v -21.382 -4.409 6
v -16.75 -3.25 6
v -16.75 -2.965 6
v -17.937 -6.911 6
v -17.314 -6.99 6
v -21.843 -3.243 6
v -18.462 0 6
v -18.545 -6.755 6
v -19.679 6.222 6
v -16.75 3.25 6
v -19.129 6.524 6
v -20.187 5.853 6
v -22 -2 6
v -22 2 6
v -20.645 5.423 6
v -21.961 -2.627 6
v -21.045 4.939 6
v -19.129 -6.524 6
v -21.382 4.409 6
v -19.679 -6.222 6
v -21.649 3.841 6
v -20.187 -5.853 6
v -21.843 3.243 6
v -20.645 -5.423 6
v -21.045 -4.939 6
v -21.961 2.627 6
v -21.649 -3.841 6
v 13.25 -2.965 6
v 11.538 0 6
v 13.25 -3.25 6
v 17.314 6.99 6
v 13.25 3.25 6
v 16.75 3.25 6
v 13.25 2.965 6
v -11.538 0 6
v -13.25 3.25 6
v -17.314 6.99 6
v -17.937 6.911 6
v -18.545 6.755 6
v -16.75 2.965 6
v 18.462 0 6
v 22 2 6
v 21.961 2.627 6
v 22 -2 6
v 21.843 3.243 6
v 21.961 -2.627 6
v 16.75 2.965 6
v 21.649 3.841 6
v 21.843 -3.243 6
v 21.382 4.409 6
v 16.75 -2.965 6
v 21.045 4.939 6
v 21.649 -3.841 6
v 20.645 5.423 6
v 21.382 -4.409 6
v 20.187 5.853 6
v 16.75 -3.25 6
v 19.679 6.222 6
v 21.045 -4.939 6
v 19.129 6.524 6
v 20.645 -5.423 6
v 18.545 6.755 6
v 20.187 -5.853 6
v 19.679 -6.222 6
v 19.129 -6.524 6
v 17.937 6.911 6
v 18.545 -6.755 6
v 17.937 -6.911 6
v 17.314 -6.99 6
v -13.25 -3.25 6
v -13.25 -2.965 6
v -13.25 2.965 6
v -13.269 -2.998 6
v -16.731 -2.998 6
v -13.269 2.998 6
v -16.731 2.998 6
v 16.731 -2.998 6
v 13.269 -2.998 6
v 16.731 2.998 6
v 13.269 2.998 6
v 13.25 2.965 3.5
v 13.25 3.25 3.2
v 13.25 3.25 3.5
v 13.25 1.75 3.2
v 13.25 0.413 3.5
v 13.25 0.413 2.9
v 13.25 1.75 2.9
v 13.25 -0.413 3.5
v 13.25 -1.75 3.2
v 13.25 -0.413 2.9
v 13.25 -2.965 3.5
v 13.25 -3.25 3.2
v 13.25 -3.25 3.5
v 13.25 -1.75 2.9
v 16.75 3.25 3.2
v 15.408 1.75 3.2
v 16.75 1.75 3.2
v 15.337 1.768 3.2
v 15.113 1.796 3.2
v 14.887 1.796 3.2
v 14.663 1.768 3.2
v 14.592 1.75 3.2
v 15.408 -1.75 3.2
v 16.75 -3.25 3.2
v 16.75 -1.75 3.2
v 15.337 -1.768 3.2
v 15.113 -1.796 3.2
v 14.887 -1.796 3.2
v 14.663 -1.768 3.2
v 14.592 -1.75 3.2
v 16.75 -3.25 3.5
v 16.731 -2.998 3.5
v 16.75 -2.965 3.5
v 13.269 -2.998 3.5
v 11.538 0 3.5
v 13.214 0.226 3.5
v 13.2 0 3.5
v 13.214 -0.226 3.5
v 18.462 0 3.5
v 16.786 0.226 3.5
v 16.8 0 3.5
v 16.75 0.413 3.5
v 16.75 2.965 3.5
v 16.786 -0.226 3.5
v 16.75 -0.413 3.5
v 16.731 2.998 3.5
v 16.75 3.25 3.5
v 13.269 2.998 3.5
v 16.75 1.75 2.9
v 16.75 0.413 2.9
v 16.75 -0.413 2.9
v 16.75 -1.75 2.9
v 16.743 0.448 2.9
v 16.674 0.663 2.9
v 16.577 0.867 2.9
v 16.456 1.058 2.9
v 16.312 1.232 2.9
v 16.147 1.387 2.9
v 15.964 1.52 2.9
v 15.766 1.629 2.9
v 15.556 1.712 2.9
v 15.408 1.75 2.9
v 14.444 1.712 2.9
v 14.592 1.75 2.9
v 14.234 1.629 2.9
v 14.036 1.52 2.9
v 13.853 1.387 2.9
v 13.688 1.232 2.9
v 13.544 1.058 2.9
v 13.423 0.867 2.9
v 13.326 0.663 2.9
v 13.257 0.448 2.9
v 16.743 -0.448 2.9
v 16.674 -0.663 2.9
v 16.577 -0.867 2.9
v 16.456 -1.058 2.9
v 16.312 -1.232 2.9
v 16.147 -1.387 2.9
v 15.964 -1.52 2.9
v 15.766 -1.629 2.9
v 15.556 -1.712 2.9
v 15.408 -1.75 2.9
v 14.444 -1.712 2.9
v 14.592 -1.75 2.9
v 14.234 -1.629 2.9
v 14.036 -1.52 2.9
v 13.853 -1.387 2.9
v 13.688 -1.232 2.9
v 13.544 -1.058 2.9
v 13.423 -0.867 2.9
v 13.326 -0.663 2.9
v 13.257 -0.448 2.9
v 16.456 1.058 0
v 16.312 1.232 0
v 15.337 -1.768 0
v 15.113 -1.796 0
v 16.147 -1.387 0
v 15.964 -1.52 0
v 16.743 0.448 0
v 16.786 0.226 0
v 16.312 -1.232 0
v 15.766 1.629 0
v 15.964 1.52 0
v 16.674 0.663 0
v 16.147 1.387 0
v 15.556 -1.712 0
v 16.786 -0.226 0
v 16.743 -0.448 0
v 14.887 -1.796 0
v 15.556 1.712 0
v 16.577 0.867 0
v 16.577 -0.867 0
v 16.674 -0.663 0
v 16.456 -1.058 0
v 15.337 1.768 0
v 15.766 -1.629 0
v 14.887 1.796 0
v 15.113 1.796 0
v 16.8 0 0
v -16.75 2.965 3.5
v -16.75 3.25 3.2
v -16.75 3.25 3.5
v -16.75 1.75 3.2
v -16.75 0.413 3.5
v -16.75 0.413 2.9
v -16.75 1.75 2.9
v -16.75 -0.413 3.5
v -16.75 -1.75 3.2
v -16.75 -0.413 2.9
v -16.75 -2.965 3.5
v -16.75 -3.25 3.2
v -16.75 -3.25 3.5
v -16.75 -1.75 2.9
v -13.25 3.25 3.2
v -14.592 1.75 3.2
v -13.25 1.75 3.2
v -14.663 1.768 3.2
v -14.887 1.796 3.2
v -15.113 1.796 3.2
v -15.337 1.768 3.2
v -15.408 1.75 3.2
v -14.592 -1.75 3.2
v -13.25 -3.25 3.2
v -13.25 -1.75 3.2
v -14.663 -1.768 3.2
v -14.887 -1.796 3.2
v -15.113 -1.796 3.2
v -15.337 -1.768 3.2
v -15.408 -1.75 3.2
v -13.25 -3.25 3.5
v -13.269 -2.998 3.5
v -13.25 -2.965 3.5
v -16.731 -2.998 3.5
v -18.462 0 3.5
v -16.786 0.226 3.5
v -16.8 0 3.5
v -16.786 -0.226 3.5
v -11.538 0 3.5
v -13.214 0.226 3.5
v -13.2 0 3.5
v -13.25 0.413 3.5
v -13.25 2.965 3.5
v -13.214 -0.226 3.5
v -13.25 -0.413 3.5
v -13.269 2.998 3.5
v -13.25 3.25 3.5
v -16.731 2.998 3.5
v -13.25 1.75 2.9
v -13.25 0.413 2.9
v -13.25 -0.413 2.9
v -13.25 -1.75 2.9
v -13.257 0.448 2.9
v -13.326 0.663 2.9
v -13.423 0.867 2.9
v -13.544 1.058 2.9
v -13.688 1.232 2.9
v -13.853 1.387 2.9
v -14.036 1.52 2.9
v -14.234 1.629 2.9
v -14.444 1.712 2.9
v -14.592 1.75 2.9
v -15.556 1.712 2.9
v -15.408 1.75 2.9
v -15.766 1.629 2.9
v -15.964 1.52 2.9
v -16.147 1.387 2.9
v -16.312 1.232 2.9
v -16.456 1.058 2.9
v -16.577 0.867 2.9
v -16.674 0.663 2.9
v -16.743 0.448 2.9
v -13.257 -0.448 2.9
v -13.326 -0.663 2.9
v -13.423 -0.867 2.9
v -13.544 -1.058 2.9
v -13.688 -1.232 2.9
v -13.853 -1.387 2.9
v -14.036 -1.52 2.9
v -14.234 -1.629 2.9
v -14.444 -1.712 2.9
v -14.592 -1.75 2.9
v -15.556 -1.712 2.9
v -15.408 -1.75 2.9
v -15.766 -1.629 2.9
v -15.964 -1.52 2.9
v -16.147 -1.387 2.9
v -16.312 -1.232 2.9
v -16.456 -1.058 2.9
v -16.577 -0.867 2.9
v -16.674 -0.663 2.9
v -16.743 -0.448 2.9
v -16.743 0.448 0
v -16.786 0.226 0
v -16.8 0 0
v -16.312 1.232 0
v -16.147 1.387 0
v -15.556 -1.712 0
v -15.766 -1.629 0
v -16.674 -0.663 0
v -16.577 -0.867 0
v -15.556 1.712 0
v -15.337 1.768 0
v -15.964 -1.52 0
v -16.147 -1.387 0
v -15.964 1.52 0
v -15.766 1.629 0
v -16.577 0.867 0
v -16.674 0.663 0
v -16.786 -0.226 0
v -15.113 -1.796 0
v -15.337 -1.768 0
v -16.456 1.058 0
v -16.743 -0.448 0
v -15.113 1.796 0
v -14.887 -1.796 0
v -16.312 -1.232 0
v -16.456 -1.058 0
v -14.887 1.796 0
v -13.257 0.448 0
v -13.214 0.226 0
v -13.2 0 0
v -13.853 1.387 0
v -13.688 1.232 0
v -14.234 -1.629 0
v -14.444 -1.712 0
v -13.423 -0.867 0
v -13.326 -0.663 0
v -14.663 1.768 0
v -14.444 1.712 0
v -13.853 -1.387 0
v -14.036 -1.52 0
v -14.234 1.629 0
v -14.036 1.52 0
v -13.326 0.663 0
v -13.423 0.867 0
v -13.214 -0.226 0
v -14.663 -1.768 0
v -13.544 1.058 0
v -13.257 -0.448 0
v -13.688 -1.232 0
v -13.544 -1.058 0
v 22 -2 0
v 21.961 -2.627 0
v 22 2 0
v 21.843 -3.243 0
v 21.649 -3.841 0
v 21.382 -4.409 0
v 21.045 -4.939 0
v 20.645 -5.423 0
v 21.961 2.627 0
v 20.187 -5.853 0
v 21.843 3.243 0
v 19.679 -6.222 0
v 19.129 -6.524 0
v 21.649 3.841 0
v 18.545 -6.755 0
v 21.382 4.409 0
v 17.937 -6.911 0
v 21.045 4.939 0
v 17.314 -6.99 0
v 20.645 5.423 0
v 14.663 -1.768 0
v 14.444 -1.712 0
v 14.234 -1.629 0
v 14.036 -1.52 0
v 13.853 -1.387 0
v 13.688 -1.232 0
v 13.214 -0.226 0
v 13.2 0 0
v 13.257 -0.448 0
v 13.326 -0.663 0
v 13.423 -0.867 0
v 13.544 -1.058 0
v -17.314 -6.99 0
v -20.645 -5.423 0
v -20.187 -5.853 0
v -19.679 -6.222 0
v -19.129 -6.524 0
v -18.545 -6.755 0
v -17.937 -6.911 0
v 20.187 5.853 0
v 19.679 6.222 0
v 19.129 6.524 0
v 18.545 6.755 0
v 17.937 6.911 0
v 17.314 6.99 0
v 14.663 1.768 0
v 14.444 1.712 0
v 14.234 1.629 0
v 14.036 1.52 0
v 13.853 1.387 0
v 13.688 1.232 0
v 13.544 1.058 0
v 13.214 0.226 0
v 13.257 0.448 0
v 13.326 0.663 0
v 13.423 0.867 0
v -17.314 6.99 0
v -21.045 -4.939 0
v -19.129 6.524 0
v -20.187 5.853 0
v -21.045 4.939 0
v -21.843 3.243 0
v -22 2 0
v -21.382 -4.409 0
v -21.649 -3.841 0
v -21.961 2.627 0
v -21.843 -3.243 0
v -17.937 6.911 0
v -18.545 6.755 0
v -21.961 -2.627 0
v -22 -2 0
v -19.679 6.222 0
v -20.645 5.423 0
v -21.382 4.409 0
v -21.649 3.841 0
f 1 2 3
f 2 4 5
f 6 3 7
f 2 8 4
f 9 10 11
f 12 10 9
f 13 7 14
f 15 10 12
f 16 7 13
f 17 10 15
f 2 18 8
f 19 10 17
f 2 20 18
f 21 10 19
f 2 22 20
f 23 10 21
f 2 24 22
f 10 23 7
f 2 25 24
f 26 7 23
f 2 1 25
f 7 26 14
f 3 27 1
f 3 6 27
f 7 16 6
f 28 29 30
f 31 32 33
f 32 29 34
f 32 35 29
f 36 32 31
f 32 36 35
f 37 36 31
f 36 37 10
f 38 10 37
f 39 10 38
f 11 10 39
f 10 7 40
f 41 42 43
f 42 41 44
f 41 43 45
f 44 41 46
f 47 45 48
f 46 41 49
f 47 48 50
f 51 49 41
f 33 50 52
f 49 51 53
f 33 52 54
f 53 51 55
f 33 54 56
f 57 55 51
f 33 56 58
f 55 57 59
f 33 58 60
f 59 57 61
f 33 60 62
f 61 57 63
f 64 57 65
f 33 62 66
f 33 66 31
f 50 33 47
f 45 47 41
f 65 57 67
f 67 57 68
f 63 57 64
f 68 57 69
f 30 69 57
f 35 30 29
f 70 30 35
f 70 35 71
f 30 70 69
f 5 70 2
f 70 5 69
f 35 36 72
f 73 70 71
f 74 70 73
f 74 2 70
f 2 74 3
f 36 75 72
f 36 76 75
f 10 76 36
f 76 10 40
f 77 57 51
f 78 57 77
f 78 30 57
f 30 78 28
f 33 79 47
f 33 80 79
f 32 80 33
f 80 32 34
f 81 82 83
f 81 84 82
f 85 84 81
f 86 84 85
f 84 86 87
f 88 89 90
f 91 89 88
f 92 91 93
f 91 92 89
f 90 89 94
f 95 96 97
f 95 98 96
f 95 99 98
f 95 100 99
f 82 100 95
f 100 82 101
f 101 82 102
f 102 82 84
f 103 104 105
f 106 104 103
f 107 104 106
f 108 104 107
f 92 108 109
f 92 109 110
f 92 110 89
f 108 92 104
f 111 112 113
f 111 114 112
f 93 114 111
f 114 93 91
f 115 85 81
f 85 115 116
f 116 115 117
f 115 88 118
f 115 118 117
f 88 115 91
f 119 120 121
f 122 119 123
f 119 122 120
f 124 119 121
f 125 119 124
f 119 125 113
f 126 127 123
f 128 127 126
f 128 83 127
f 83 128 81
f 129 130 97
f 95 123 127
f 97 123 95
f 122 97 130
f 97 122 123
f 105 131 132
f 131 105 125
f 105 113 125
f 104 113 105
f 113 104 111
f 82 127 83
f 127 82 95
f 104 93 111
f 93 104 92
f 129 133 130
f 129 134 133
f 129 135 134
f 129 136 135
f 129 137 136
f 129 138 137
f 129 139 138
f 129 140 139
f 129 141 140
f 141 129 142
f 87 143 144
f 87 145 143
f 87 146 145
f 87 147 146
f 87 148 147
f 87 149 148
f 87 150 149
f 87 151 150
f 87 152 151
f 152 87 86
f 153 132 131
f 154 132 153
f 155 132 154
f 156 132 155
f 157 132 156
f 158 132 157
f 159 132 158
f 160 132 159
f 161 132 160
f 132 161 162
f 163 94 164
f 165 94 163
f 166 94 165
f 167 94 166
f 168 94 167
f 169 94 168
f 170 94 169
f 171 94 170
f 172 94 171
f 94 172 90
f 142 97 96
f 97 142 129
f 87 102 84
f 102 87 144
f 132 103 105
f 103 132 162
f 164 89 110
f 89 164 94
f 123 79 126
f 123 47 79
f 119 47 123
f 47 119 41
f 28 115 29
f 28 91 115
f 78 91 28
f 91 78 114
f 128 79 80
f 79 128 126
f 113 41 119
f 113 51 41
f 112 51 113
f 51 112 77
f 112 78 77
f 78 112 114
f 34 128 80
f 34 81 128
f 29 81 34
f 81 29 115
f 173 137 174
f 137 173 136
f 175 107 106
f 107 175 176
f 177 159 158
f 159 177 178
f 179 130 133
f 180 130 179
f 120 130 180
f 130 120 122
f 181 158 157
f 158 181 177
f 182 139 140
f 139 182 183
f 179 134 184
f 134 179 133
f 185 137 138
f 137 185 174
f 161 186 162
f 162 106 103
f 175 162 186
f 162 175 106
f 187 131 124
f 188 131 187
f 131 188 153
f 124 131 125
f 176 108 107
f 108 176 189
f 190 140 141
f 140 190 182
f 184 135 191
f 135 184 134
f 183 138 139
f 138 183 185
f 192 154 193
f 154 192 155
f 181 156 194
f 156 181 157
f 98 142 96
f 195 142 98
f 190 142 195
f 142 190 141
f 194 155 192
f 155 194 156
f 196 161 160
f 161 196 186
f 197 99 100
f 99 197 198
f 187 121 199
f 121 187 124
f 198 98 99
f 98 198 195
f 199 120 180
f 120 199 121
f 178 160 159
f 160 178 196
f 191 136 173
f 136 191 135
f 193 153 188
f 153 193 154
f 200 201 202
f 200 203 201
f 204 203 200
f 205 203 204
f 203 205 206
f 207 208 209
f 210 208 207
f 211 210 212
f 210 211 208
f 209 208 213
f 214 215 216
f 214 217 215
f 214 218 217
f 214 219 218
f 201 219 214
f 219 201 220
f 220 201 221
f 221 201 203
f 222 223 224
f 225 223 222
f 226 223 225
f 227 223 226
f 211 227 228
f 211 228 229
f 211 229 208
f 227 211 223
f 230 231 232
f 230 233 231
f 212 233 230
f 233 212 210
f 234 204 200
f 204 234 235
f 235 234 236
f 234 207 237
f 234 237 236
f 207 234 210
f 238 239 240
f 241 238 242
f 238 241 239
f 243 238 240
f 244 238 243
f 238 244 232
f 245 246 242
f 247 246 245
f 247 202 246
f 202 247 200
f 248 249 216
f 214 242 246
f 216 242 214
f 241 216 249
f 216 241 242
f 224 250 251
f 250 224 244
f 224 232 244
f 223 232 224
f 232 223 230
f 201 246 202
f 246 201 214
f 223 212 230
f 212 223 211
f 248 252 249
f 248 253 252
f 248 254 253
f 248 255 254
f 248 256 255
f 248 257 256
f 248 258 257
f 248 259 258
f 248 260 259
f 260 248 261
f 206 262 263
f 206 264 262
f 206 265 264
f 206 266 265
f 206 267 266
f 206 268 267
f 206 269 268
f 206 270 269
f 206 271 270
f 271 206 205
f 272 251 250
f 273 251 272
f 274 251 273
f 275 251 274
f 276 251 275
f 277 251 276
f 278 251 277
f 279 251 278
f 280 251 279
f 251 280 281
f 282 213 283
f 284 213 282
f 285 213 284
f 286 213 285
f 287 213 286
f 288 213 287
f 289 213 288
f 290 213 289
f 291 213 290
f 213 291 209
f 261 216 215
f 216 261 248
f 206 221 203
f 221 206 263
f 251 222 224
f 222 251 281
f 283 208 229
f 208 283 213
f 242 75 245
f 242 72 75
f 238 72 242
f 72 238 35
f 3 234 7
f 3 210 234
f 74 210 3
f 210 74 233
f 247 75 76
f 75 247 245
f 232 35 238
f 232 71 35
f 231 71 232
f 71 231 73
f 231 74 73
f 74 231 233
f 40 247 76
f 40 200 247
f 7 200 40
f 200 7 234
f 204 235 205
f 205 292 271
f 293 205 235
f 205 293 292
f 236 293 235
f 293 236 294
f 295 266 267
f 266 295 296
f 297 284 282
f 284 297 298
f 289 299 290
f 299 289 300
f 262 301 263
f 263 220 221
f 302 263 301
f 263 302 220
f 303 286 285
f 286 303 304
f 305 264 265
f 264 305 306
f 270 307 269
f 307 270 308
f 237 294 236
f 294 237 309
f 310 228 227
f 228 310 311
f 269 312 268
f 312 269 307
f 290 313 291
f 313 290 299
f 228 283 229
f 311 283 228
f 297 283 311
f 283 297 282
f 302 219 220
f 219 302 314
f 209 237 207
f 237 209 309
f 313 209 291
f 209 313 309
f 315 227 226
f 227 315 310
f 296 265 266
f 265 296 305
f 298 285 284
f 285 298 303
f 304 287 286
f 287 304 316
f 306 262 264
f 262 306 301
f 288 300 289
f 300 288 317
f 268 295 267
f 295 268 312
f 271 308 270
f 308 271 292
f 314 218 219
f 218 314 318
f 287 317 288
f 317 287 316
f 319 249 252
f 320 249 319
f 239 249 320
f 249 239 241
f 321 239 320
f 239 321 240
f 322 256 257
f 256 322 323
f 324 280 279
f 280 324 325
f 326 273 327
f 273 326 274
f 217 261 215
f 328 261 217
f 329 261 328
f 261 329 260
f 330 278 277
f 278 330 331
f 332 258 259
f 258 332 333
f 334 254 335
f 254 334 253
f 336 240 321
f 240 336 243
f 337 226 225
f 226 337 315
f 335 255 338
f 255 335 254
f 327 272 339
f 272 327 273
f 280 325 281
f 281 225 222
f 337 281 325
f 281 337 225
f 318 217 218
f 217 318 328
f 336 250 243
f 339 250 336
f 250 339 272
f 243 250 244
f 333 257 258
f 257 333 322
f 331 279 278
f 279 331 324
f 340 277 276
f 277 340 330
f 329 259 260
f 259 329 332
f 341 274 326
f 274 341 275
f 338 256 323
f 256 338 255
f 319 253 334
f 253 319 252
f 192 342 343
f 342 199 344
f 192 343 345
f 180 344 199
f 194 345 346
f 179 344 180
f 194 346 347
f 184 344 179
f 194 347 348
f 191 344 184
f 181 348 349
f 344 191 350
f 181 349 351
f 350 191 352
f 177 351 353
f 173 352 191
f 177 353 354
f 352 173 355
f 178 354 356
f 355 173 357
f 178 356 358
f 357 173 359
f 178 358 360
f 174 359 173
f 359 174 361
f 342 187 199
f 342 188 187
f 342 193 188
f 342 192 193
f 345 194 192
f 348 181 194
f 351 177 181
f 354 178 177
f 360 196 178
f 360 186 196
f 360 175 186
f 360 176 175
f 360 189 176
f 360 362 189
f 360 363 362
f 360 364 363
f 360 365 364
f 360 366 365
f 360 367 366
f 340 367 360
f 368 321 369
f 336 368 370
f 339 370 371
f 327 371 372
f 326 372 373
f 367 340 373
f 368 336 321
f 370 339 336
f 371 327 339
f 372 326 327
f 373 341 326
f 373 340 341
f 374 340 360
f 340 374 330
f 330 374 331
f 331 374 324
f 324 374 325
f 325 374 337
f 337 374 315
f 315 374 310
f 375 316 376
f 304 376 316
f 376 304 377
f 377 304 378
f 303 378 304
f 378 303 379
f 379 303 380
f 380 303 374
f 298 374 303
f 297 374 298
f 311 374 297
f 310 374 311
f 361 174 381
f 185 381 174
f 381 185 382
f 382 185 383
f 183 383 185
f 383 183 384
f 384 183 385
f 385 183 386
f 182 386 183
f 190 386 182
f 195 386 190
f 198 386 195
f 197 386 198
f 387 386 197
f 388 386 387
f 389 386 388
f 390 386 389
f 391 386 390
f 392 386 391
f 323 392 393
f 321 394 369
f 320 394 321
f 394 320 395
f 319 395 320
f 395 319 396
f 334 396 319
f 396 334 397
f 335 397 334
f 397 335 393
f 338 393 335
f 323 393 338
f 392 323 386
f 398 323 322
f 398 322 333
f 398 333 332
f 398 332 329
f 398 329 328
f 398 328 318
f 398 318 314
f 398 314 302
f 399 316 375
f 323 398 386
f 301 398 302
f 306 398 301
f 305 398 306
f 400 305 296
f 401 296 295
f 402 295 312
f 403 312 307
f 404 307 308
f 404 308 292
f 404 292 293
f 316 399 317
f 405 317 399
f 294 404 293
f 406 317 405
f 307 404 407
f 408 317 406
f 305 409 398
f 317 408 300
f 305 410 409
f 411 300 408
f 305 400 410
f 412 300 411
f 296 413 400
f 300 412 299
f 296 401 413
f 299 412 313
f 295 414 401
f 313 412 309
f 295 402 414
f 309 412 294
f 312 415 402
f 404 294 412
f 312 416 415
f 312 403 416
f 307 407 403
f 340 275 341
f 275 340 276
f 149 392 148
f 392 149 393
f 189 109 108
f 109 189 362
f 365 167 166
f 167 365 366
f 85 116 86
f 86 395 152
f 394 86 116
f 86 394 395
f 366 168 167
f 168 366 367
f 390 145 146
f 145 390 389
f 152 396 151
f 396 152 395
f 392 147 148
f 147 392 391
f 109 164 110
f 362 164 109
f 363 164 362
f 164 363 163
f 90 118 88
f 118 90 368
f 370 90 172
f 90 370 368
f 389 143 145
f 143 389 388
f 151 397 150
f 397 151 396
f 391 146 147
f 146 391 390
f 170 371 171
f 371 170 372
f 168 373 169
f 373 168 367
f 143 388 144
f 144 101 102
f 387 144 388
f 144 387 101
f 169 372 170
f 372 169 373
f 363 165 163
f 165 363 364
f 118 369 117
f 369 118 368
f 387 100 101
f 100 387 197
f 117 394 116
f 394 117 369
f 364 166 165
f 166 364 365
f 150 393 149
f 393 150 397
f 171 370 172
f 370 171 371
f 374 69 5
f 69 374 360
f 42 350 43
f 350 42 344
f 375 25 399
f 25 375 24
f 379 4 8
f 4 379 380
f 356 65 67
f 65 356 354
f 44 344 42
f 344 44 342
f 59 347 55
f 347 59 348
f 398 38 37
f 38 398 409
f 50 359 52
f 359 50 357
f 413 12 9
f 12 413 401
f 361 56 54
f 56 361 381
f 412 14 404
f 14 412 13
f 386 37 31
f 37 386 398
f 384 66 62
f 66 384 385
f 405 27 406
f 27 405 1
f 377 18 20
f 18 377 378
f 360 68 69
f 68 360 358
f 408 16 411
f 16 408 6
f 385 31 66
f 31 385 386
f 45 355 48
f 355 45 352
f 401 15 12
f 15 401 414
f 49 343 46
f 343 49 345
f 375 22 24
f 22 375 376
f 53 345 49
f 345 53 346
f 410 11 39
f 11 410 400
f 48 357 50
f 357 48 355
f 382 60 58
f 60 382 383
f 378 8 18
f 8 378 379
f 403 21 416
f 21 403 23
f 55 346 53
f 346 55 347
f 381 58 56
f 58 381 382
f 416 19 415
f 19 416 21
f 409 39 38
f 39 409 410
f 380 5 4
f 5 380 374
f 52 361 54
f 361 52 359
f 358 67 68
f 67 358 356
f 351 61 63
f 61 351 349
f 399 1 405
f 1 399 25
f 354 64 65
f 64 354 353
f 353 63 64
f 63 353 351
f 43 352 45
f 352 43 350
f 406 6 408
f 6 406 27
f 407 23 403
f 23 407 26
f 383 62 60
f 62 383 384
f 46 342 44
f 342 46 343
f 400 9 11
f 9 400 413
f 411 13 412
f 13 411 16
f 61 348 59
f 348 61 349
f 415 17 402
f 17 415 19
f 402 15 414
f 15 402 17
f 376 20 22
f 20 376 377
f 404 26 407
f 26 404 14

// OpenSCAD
$fn = 50;


difference() {
	union() {
		hull() {
			translate(v = [-17.0000000000, 2.0000000000, 0]) {
				cylinder(h = 6, r = 5);
			}
			translate(v = [17.0000000000, 2.0000000000, 0]) {
				cylinder(h = 6, r = 5);
			}
			translate(v = [-17.0000000000, -2.0000000000, 0]) {
				cylinder(h = 6, r = 5);
			}
			translate(v = [17.0000000000, -2.0000000000, 0]) {
				cylinder(h = 6, r = 5);
			}
		}
	}
	union() {
		translate(v = [15.0000000000, 0, -20]) {
			rotate(a = [0, 180, 0]) {
				difference() {
					union() {
						translate(v = [0, 0, -26.0000000000]) {
							rotate(a = [0, 0, 0]) {
								difference() {
									union() {
										#translate(v = [-1.7500000000, -3.2500000000, -0.3000000000]) {
											cube(size = [3.5000000000, 6.5000000000, 0.3000000000]);
										}
										#translate(v = [-1.7500000000, -1.7500000000, -0.6000000000]) {
											cube(size = [3.5000000000, 3.5000000000, 0.3000000000]);
										}
										#translate(v = [-1.7500000000, -3.2500000000, 2.5000000000]) {
											cube(size = [3.5000000000, 6.5000000000, 0.3000000000]);
										}
										#translate(v = [-1.7500000000, -1.7500000000, 2.8000000000]) {
											cube(size = [3.5000000000, 3.5000000000, 0.3000000000]);
										}
										#linear_extrude(height = 2.5000000000) {
											polygon(points = [[3.4620000000, 0.0000000000], [1.7310000000, 2.9981799479], [-1.7310000000, 2.9981799479], [-3.4620000000, 0.0000000000], [-1.7310000000, -2.9981799479], [1.7310000000, -2.9981799479]]);
										}
										#translate(v = [-1.7500000000, -3.2500000000, -0.3000000000]) {
											cube(size = [3.5000000000, 6.5000000000, 0.3000000000]);
										}
										#translate(v = [-1.7500000000, -1.7500000000, -0.6000000000]) {
											cube(size = [3.5000000000, 3.5000000000, 0.3000000000]);
										}
										#translate(v = [-1.7500000000, -3.2500000000, 2.5000000000]) {
											cube(size = [3.5000000000, 6.5000000000, 0.3000000000]);
										}
										#translate(v = [-1.7500000000, -1.7500000000, 2.8000000000]) {
											cube(size = [3.5000000000, 3.5000000000, 0.3000000000]);
										}
										#translate(v = [-1.7500000000, -3.2500000000, -0.3000000000]) {
											cube(size = [3.5000000000, 6.5000000000, 0.3000000000]);
										}
										#translate(v = [-1.7500000000, -1.7500000000, -0.6000000000]) {
											cube(size = [3.5000000000, 3.5000000000, 0.3000000000]);
										}
										#translate(v = [-1.7500000000, -3.2500000000, 2.5000000000]) {
											cube(size = [3.5000000000, 6.5000000000, 0.3000000000]);
										}
										#translate(v = [-1.7500000000, -1.7500000000, 2.8000000000]) {
											cube(size = [3.5000000000, 3.5000000000, 0.3000000000]);
										}
									}
									union();
								}
							}
						}
						translate(v = [0, 0, -26.0000000000]) {
							rotate(a = [0, 0, 0]) {
								difference() {
									union() {
										#translate(v = [-1.7500000000, -3.2500000000, -0.3000000000]) {
											cube(size = [3.5000000000, 6.5000000000, 0.3000000000]);
										}
										#translate(v = [-1.7500000000, -1.7500000000, -0.6000000000]) {
											cube(size = [3.5000000000, 3.5000000000, 0.3000000000]);
										}
										#translate(v = [-1.7500000000, -3.2500000000, 2.5000000000]) {
											cube(size = [3.5000000000, 6.5000000000, 0.3000000000]);
										}
										#translate(v = [-1.7500000000, -1.7500000000, 2.8000000000]) {
											cube(size = [3.5000000000, 3.5000000000, 0.3000000000]);
										}
										#linear_extrude(height = 2.5000000000) {
											polygon(points = [[3.4620000000, 0.0000000000], [1.7310000000, 2.9981799479], [-1.7310000000, 2.9981799479], [-3.4620000000, 0.0000000000], [-1.7310000000, -2.9981799479], [1.7310000000, -2.9981799479]]);
										}
										#translate(v = [-1.7500000000, -3.2500000000, -0.3000000000]) {
											cube(size = [3.5000000000, 6.5000000000, 0.3000000000]);
										}
										#translate(v = [-1.7500000000, -1.7500000000, -0.6000000000]) {
											cube(size = [3.5000000000, 3.5000000000, 0.3000000000]);
										}
										#translate(v = [-1.7500000000, -3.2500000000, 2.5000000000]) {
											cube(size = [3.5000000000, 6.5000000000, 0.3000000000]);
										}
										#translate(v = [-1.7500000000, -1.7500000000, 2.8000000000]) {
											cube(size = [3.5000000000, 3.5000000000, 0.3000000000]);
										}
										#translate(v = [-1.7500000000, -3.2500000000, -0.3000000000]) {
											cube(size = [3.5000000000, 6.5000000000, 0.3000000000]);
										}
										#translate(v = [-1.7500000000, -1.7500000000, -0.6000000000]) {
											cube(size = [3.5000000000, 3.5000000000, 0.3000000000]);
										}
										#translate(v = [-1.7500000000, -3.2500000000, 2.5000000000]) {
											cube(size = [3.5000000000, 6.5000000000, 0.3000000000]);
										}
										#translate(v = [-1.7500000000, -1.7500000000, 2.8000000000]) {
											cube(size = [3.5000000000, 3.5000000000, 0.3000000000]);
										}
									}
									union();
								}
							}
						}
						translate(v = [0, 0, -26.0000000000]) {
							rotate(a = [0, 0, 0]) {
								difference() {
									union() {
										#translate(v = [-1.7500000000, -3.2500000000, -0.3000000000]) {
											cube(size = [3.5000000000, 6.5000000000, 0.3000000000]);
										}
										#translate(v = [-1.7500000000, -1.7500000000, -0.6000000000]) {
											cube(size = [3.5000000000, 3.5000000000, 0.3000000000]);
										}
										#translate(v = [-1.7500000000, -3.2500000000, 2.5000000000]) {
											cube(size = [3.5000000000, 6.5000000000, 0.3000000000]);
										}
										#translate(v = [-1.7500000000, -1.7500000000, 2.8000000000]) {
											cube(size = [3.5000000000, 3.5000000000, 0.3000000000]);
										}
										#linear_extrude(height = 2.5000000000) {
											polygon(points = [[3.4620000000, 0.0000000000], [1.7310000000, 2.9981799479], [-1.7310000000, 2.9981799479], [-3.4620000000, 0.0000000000], [-1.7310000000, -2.9981799479], [1.7310000000, -2.9981799479]]);
										}
										#translate(v = [-1.7500000000, -3.2500000000, -0.3000000000]) {
											cube(size = [3.5000000000, 6.5000000000, 0.3000000000]);
										}
										#translate(v = [-1.7500000000, -1.7500000000, -0.6000000000]) {
											cube(size = [3.5000000000, 3.5000000000, 0.3000000000]);
										}
										#translate(v = [-1.7500000000, -3.2500000000, 2.5000000000]) {
											cube(size = [3.5000000000, 6.5000000000, 0.3000000000]);
										}
										#translate(v = [-1.7500000000, -1.7500000000, 2.8000000000]) {
											cube(size = [3.5000000000, 3.5000000000, 0.3000000000]);
										}
										#translate(v = [-1.7500000000, -3.2500000000, -0.3000000000]) {
											cube(size = [3.5000000000, 6.5000000000, 0.3000000000]);
										}
										#translate(v = [-1.7500000000, -1.7500000000, -0.6000000000]) {
											cube(size = [3.5000000000, 3.5000000000, 0.3000000000]);
										}
										#translate(v = [-1.7500000000, -3.2500000000, 2.5000000000]) {
											cube(size = [3.5000000000, 6.5000000000, 0.3000000000]);
										}
										#translate(v = [-1.7500000000, -1.7500000000, 2.8000000000]) {
											cube(size = [3.5000000000, 3.5000000000, 0.3000000000]);
										}
									}
									union();
								}
							}
						}
						#translate(v = [0, 0, -26.0000000000]) {
							cylinder(h = 26, r = 1.5000000000);
						}
						#translate(v = [0, 0, -1.9000000000]) {
							cylinder(h = 1.9000000000, r1 = 1.8000000000, r2 = 3.6000000000);
						}
						#translate(v = [0, 0, -26.0000000000]) {
							cylinder(h = 26, r = 1.8000000000);
						}
						#translate(v = [0, 0, -26.0000000000]) {
							cylinder(h = 26, r = 1.5000000000);
						}
					}
					union();
				}
			}
		}
		translate(v = [-15.0000000000, 0, -20]) {
			rotate(a = [0, 180, 0]) {
				difference() {
					union() {
						translate(v = [0, 0, -26.0000000000]) {
							rotate(a = [0, 0, 0]) {
								difference() {
									union() {
										#translate(v = [-1.7500000000, -3.2500000000, -0.3000000000]) {
											cube(size = [3.5000000000, 6.5000000000, 0.3000000000]);
										}
										#translate(v = [-1.7500000000, -1.7500000000, -0.6000000000]) {
											cube(size = [3.5000000000, 3.5000000000, 0.3000000000]);
										}
										#translate(v = [-1.7500000000, -3.2500000000, 2.5000000000]) {
											cube(size = [3.5000000000, 6.5000000000, 0.3000000000]);
										}
										#translate(v = [-1.7500000000, -1.7500000000, 2.8000000000]) {
											cube(size = [3.5000000000, 3.5000000000, 0.3000000000]);
										}
										#linear_extrude(height = 2.5000000000) {
											polygon(points = [[3.4620000000, 0.0000000000], [1.7310000000, 2.9981799479], [-1.7310000000, 2.9981799479], [-3.4620000000, 0.0000000000], [-1.7310000000, -2.9981799479], [1.7310000000, -2.9981799479]]);
										}
										#translate(v = [-1.7500000000, -3.2500000000, -0.3000000000]) {
											cube(size = [3.5000000000, 6.5000000000, 0.3000000000]);
										}
										#translate(v = [-1.7500000000, -1.7500000000, -0.6000000000]) {
											cube(size = [3.5000000000, 3.5000000000, 0.3000000000]);
										}
										#translate(v = [-1.7500000000, -3.2500000000, 2.5000000000]) {
											cube(size = [3.5000000000, 6.5000000000, 0.3000000000]);
										}
										#translate(v = [-1.7500000000, -1.7500000000, 2.8000000000]) {
											cube(size = [3.5000000000, 3.5000000000, 0.3000000000]);
										}
										#translate(v = [-1.7500000000, -3.2500000000, -0.3000000000]) {
											cube(size = [3.5000000000, 6.5000000000, 0.3000000000]);
										}
										#translate(v = [-1.7500000000, -1.7500000000, -0.6000000000]) {
											cube(size = [3.5000000000, 3.5000000000, 0.3000000000]);
										}
										#translate(v = [-1.7500000000, -3.2500000000, 2.5000000000]) {
											cube(size = [3.5000000000, 6.5000000000, 0.3000000000]);
										}
										#translate(v = [-1.7500000000, -1.7500000000, 2.8000000000]) {
											cube(size = [3.5000000000, 3.5000000000, 0.3000000000]);
										}
									}
									union();
								}
							}
						}
						translate(v = [0, 0, -26.0000000000]) {
							rotate(a = [0, 0, 0]) {
								difference() {
									union() {
										#translate(v = [-1.7500000000, -3.2500000000, -0.3000000000]) {
											cube(size = [3.5000000000, 6.5000000000, 0.3000000000]);
										}
										#translate(v = [-1.7500000000, -1.7500000000, -0.6000000000]) {
											cube(size = [3.5000000000, 3.5000000000, 0.3000000000]);
										}
										#translate(v = [-1.7500000000, -3.2500000000, 2.5000000000]) {
											cube(size = [3.5000000000, 6.5000000000, 0.3000000000]);
										}
										#translate(v = [-1.7500000000, -1.7500000000, 2.8000000000]) {
											cube(size = [3.5000000000, 3.5000000000, 0.3000000000]);
										}
										#linear_extrude(height = 2.5000000000) {
											polygon(points = [[3.4620000000, 0.0000000000], [1.7310000000, 2.9981799479], [-1.7310000000, 2.9981799479], [-3.4620000000, 0.0000000000], [-1.7310000000, -2.9981799479], [1.7310000000, -2.9981799479]]);
										}
										#translate(v = [-1.7500000000, -3.2500000000, -0.3000000000]) {
											cube(size = [3.5000000000, 6.5000000000, 0.3000000000]);
										}
										#translate(v = [-1.7500000000, -1.7500000000, -0.6000000000]) {
											cube(size = [3.5000000000, 3.5000000000, 0.3000000000]);
										}
										#translate(v = [-1.7500000000, -3.2500000000, 2.5000000000]) {
											cube(size = [3.5000000000, 6.5000000000, 0.3000000000]);
										}
										#translate(v = [-1.7500000000, -1.7500000000, 2.8000000000]) {
											cube(size = [3.5000000000, 3.5000000000, 0.3000000000]);
										}
										#translate(v = [-1.7500000000, -3.2500000000, -0.3000000000]) {
											cube(size = [3.5000000000, 6.5000000000, 0.3000000000]);
										}
										#translate(v = [-1.7500000000, -1.7500000000, -0.6000000000]) {
											cube(size = [3.5000000000, 3.5000000000, 0.3000000000]);
										}
										#translate(v = [-1.7500000000, -3.2500000000, 2.5000000000]) {
											cube(size = [3.5000000000, 6.5000000000, 0.3000000000]);
										}
										#translate(v = [-1.7500000000, -1.7500000000, 2.8000000000]) {
											cube(size = [3.5000000000, 3.5000000000, 0.3000000000]);
										}
									}
									union();
								}
							}
						}
						translate(v = [0, 0, -26.0000000000]) {
							rotate(a = [0, 0, 0]) {
								difference() {
									union() {
										#translate(v = [-1.7500000000, -3.2500000000, -0.3000000000]) {
											cube(size = [3.5000000000, 6.5000000000, 0.3000000000]);
										}
										#translate(v = [-1.7500000000, -1.7500000000, -0.6000000000]) {
											cube(size = [3.5000000000, 3.5000000000, 0.3000000000]);
										}
										#translate(v = [-1.7500000000, -3.2500000000, 2.5000000000]) {
											cube(size = [3.5000000000, 6.5000000000, 0.3000000000]);
										}
										#translate(v = [-1.7500000000, -1.7500000000, 2.8000000000]) {
											cube(size = [3.5000000000, 3.5000000000, 0.3000000000]);
										}
										#linear_extrude(height = 2.5000000000) {
											polygon(points = [[3.4620000000, 0.0000000000], [1.7310000000, 2.9981799479], [-1.7310000000, 2.9981799479], [-3.4620000000, 0.0000000000], [-1.7310000000, -2.9981799479], [1.7310000000, -2.9981799479]]);
										}
										#translate(v = [-1.7500000000, -3.2500000000, -0.3000000000]) {
											cube(size = [3.5000000000, 6.5000000000, 0.3000000000]);
										}
										#translate(v = [-1.7500000000, -1.7500000000, -0.6000000000]) {
											cube(size = [3.5000000000, 3.5000000000, 0.3000000000]);
										}
										#translate(v = [-1.7500000000, -3.2500000000, 2.5000000000]) {
											cube(size = [3.5000000000, 6.5000000000, 0.3000000000]);
										}
										#translate(v = [-1.7500000000, -1.7500000000, 2.8000000000]) {
											cube(size = [3.5000000000, 3.5000000000, 0.3000000000]);
										}
										#translate(v = [-1.7500000000, -3.2500000000, -0.3000000000]) {
											cube(size = [3.5000000000, 6.5000000000, 0.3000000000]);
										}
										#translate(v = [-1.7500000000, -1.7500000000, -0.6000000000]) {
											cube(size = [3.5000000000, 3.5000000000, 0.3000000000]);
										}
										#translate(v = [-1.7500000000, -3.2500000000, 2.5000000000]) {
											cube(size = [3.5000000000, 6.5000000000, 0.3000000000]);
										}
										#translate(v = [-1.7500000000, -1.7500000000, 2.8000000000]) {
											cube(size = [3.5000000000, 3.5000000000, 0.3000000000]);
										}
									}
									union();
								}
							}
						}
						#translate(v = [0, 0, -26.0000000000]) {
							cylinder(h = 26, r = 1.5000000000);
						}
						#translate(v = [0, 0, -1.9000000000]) {
							cylinder(h = 1.9000000000, r1 = 1.8000000000, r2 = 3.6000000000);
						}
						#translate(v = [0, 0, -26.0000000000]) {
							cylinder(h = 26, r = 1.8000000000);
						}
						#translate(v = [0, 0, -26.0000000000]) {
							cylinder(h = 26, r = 1.5000000000);
						}
					}
					union();
				}
			}
		}
		translate(v = [-15.0000000000, 0.0000000000, 0]) {
			cylinder(h = 6, r = 1.8000000000);
		}
		translate(v = [15.0000000000, 0.0000000000, 0]) {
			cylinder(h = 6, r = 1.8000000000);
		}
		translate(v = [-15.0000000000, 0.0000000000, 0]) {
			cylinder(h = 6, r = 1.8000000000);
		}
		translate(v = [15.0000000000, 0.0000000000, 0]) {
			cylinder(h = 6, r = 1.8000000000);
		}
		translate(v = [-15.0000000000, 0.0000000000, 0]) {
			cylinder(h = 6, r = 1.8000000000);
		}
		translate(v = [15.0000000000, 0.0000000000, 0]) {
			cylinder(h = 6, r = 1.8000000000);
		}
		translate(v = [-15.0000000000, 0.0000000000, 0]) {
			cylinder(h = 6, r = 1.8000000000);
		}
		translate(v = [15.0000000000, 0.0000000000, 0]) {
			cylinder(h = 6, r = 1.8000000000);
		}
	}
}
